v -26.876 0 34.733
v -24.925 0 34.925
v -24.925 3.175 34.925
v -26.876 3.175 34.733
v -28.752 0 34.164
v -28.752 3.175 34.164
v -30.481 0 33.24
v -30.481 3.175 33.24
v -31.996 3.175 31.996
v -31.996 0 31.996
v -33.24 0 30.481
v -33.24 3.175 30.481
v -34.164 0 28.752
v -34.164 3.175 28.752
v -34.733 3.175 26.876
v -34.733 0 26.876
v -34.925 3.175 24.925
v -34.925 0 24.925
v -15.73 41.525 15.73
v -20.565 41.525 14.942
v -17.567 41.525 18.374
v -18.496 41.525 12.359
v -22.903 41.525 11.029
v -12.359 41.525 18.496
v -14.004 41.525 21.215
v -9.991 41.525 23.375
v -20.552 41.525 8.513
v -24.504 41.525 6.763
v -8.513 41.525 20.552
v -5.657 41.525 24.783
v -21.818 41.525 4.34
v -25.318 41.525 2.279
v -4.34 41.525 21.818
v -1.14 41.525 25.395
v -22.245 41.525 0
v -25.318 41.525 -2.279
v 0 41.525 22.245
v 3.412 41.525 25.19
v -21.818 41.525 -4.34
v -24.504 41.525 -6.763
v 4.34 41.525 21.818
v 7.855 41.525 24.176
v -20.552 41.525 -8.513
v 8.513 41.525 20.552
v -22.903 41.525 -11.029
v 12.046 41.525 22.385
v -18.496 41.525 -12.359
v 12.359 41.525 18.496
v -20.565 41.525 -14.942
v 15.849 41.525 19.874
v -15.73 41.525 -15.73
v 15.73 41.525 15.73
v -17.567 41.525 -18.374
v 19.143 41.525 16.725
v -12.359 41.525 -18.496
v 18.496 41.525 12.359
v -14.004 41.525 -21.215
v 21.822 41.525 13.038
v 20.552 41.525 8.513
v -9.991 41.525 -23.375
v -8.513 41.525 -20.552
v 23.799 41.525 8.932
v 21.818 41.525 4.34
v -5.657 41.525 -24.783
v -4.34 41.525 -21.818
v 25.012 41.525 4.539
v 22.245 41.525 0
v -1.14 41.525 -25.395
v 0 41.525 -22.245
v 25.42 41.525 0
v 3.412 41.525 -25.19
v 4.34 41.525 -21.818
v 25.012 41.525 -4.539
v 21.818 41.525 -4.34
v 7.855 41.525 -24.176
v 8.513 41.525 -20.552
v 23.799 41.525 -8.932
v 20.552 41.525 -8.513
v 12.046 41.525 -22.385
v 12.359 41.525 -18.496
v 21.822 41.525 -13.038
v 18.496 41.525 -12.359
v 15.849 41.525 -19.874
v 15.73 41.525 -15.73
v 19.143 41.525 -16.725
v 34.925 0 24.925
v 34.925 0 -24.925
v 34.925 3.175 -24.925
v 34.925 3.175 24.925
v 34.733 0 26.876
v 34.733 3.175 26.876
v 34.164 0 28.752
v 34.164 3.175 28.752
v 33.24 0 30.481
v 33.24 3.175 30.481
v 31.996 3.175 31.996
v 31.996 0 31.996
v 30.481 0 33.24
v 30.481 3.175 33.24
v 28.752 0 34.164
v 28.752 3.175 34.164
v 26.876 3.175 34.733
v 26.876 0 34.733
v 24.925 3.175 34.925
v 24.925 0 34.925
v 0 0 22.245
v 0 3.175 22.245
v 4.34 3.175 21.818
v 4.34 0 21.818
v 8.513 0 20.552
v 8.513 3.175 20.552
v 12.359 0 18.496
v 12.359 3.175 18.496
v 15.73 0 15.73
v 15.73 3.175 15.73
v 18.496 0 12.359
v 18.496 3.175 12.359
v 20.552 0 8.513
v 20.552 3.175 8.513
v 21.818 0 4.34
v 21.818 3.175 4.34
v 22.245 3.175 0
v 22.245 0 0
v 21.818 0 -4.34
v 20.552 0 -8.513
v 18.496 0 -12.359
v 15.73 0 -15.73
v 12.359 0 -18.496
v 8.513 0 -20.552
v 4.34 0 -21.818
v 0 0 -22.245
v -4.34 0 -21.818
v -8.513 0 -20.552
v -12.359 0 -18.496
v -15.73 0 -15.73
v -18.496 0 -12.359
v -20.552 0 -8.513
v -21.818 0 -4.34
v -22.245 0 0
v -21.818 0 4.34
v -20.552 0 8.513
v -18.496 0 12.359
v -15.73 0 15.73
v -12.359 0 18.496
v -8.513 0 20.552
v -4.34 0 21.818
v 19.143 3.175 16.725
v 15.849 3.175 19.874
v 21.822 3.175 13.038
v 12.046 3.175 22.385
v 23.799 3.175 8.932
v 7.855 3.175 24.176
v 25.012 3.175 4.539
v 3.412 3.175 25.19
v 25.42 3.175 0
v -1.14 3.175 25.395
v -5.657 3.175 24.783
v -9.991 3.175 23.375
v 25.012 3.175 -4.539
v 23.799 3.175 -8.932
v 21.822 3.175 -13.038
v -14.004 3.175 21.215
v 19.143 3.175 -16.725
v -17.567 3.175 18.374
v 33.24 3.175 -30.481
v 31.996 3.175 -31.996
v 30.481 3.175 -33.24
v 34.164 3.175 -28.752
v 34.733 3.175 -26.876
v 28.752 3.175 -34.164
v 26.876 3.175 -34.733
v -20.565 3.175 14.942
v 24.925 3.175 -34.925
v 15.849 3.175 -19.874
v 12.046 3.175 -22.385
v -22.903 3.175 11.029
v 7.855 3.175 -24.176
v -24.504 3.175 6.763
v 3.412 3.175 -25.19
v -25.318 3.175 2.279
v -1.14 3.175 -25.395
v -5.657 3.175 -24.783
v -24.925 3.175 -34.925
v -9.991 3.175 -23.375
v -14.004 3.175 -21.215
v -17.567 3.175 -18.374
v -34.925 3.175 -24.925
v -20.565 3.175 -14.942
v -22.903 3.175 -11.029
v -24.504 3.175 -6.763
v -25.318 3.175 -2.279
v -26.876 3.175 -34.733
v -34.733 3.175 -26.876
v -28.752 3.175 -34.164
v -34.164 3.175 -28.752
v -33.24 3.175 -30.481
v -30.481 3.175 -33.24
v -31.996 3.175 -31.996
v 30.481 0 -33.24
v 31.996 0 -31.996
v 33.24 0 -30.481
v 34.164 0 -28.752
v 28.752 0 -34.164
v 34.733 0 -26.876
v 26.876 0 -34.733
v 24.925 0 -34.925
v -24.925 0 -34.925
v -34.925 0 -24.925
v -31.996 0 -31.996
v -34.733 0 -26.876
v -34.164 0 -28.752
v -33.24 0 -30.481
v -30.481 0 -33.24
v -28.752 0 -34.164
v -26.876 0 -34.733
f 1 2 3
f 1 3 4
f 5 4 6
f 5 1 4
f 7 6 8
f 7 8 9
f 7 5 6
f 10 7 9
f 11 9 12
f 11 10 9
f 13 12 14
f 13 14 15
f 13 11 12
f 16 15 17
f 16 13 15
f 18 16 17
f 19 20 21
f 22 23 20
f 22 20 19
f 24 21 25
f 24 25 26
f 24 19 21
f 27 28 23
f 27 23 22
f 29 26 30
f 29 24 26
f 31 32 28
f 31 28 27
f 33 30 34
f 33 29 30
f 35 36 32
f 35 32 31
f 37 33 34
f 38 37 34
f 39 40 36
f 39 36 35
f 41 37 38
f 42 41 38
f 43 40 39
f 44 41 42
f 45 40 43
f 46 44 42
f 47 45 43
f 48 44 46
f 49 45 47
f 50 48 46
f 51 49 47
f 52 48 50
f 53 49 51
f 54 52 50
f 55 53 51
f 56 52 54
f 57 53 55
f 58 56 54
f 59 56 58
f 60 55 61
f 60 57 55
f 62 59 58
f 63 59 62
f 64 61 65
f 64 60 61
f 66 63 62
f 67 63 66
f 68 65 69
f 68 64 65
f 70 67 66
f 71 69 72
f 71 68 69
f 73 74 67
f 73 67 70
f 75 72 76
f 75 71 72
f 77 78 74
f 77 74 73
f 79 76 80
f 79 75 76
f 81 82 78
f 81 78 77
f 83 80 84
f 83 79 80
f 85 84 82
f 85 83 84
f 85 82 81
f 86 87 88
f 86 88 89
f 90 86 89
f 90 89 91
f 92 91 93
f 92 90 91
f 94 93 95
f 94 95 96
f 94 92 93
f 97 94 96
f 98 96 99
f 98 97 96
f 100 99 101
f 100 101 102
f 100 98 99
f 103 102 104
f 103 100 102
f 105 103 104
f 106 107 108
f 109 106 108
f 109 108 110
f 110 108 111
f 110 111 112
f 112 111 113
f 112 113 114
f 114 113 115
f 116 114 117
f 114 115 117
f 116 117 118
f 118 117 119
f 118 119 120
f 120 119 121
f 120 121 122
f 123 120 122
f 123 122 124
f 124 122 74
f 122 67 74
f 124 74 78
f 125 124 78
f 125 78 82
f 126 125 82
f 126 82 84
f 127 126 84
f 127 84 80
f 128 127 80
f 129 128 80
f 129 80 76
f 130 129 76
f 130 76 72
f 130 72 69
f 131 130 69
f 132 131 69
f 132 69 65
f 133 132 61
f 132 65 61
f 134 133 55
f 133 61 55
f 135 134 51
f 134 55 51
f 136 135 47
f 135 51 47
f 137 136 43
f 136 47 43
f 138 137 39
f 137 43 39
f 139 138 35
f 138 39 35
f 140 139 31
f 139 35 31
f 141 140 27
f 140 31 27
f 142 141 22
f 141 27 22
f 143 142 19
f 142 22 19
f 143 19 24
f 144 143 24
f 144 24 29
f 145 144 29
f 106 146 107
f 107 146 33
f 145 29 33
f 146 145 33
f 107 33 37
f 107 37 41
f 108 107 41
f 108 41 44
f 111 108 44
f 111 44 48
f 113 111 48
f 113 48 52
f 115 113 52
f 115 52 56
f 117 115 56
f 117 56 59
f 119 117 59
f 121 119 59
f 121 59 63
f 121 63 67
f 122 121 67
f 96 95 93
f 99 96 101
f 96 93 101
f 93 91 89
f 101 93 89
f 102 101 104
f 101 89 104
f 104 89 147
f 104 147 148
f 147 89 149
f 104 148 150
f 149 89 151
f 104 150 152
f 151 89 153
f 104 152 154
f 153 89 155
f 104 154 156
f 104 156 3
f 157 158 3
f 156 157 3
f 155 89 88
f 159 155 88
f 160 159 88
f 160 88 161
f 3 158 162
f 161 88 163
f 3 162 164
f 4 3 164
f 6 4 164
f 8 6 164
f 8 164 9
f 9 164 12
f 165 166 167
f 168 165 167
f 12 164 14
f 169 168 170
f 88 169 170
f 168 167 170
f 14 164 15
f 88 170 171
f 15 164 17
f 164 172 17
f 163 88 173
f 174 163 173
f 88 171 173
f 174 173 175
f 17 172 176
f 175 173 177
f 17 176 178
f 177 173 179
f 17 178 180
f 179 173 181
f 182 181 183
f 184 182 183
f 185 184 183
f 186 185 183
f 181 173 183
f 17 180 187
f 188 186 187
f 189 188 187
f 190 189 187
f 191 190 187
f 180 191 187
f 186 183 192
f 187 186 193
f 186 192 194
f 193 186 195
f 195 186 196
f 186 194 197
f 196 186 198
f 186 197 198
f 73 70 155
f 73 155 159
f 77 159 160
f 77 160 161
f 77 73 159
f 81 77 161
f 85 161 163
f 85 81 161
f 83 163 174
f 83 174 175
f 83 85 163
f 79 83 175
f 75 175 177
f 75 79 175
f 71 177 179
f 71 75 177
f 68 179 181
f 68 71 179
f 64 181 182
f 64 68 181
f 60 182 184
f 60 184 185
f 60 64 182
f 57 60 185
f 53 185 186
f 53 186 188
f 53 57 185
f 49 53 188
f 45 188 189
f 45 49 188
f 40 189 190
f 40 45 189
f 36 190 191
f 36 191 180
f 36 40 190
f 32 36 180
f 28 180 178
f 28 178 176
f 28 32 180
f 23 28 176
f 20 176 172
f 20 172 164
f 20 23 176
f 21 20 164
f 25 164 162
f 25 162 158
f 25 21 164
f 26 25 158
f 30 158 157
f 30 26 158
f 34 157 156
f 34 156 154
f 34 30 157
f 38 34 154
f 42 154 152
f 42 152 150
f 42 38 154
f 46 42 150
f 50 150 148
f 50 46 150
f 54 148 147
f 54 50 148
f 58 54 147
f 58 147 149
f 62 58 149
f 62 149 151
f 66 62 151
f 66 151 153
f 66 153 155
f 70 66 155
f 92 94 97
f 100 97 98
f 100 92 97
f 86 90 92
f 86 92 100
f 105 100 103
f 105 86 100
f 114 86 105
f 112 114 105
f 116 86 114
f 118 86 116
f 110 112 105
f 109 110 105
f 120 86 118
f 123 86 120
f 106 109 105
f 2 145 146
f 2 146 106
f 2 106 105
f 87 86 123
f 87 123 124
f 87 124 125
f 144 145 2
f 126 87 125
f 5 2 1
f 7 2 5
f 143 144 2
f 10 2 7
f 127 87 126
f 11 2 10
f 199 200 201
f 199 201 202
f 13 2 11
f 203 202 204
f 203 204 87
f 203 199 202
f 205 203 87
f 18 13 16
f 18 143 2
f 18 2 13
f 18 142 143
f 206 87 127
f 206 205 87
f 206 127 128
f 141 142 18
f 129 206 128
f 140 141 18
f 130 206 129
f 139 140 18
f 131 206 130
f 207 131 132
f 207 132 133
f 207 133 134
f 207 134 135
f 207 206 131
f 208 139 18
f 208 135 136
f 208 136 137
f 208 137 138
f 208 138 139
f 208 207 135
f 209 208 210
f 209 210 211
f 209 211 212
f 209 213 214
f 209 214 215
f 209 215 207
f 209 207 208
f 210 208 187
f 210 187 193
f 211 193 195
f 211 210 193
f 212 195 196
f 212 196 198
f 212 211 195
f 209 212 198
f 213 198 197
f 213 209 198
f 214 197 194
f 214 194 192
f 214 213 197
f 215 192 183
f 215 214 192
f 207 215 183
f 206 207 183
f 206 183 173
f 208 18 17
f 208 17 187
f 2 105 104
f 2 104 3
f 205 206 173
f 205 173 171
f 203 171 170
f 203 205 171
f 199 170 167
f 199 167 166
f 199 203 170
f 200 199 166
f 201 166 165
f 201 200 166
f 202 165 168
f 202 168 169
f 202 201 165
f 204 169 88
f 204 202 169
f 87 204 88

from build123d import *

# Parameters (mm, degrees)
BOSS_EXTRUDE1_DEPTH = 3.175
SKETCH2_R           = 22.245113978
CUT_EXTRUDE1_DEPTH  = 6.35
EXTRUDE_THIN1_START = 38.35
SKETCH2_2_R         = 25.420113978
SKETCH2_2_R_2       = 22.245113978
EXTRUDE_THIN1_DEPTH = 38.35


with BuildPart() as part:
    # Sketch1 → Boss-Extrude1 (new body)
    with BuildSketch(Plane(origin=(0, 0, 0), x_dir=(1, 0, 0), z_dir=(0, 1, 0))):
        with BuildLine():
            Line((-24.925, 34.925), (24.925, 34.925))
            ThreePointArc((24.925, 34.925), (31.996067812, 31.996067812), (34.925, 24.925))
            Line((34.925, 24.925), (34.925, -24.925))
            ThreePointArc((34.925, -24.925), (31.996067812, -31.996067812), (24.925, -34.925))
            Line((24.925, -34.925), (-24.925, -34.925))
            ThreePointArc((-24.925, -34.925), (-31.996067812, -31.996067812), (-34.925, -24.925))
            Line((-34.925, -24.925), (-34.925, 24.925))
            ThreePointArc((-34.925, 24.925), (-31.996067812, 31.996067812), (-24.925, 34.925))
        make_face()
    extrude(amount=BOSS_EXTRUDE1_DEPTH)

    # Sketch2 → Cut-Extrude1 (cut)
    with BuildSketch(Plane(origin=(0, 3.175, 0), x_dir=(1, 0, 0), z_dir=(0, 1, 0))):
        Circle(SKETCH2_R)
    extrude(amount=-CUT_EXTRUDE1_DEPTH, mode=Mode.SUBTRACT)

    # Sketch2<2> → Extrude-Thin1 (add)
    with BuildSketch(Plane(origin=(0, 3.175, 0), x_dir=(1, 0, 0), z_dir=(0, 1, 0)).offset(EXTRUDE_THIN1_START)):
        Circle(SKETCH2_2_R)
        Circle(SKETCH2_2_R_2, mode=Mode.SUBTRACT)
    extrude(amount=-EXTRUDE_THIN1_DEPTH)


solid = part.part
